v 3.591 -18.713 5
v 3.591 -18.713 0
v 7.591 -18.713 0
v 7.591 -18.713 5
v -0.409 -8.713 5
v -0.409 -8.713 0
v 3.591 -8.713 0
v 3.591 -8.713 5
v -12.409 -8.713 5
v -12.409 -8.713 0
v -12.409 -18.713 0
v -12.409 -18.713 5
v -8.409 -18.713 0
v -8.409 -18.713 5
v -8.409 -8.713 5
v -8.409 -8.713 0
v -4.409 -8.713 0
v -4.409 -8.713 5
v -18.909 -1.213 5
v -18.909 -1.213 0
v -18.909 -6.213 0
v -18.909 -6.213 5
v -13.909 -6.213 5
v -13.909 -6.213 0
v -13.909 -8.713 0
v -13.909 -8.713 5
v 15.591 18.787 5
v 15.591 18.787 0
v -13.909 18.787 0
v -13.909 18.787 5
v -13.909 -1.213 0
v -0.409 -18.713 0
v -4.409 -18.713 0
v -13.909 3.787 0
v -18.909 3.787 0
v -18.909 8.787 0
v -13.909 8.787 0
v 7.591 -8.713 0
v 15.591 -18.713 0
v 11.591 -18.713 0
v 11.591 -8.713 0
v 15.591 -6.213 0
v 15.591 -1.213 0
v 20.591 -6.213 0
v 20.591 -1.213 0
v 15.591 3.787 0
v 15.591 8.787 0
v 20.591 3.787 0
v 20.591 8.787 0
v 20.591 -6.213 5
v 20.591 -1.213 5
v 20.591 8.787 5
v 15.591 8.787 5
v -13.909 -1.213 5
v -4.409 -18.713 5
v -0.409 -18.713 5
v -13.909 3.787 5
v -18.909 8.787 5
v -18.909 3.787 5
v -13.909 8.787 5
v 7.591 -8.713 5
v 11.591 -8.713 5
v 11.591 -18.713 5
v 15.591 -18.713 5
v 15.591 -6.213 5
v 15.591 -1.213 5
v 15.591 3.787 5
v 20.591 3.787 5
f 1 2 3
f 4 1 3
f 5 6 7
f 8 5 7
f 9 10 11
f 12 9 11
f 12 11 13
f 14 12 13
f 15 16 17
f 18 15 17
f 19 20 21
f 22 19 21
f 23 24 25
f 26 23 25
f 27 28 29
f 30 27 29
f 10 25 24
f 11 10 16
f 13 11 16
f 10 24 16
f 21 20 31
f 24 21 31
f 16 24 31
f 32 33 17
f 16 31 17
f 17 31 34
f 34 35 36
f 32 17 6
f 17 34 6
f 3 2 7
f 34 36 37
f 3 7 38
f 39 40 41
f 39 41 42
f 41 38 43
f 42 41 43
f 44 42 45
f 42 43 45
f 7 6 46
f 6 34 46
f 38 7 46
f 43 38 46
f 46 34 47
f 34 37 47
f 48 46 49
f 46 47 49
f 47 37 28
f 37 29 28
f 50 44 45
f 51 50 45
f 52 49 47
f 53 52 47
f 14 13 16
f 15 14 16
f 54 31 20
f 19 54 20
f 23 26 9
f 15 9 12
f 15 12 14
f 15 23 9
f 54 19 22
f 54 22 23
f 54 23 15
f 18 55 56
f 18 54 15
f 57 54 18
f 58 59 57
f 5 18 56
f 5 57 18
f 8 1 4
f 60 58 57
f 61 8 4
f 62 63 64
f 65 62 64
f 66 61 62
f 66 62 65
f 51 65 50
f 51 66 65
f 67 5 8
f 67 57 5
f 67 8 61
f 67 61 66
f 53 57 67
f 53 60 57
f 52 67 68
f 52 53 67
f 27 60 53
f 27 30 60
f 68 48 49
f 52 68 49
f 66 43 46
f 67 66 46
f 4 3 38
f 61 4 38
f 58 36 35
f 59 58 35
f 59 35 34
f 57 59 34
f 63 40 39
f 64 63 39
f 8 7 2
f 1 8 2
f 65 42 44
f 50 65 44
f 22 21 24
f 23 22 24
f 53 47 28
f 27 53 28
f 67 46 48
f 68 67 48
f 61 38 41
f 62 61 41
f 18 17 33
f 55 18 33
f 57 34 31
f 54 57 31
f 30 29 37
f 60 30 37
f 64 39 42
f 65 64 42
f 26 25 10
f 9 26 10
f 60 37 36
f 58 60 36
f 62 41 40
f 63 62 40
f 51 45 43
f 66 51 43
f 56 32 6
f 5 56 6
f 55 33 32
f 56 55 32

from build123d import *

# Parameters (mm, degrees)
BOSS_EXTRU_1_DEPTH = 5


with BuildPart() as part:
    # Esquisse2 → Boss.-Extru.1 (new body)
    with BuildSketch(Plane.XY):
        Polygon((-13.909341466, -8.713061229), (-12.409341466, -8.713061229), (-12.409341466, -18.713061229), (-8.409341466, -18.713061229), (-8.409341466, -8.713061229), (-4.409341466, -8.713061229), (-4.409341466, -18.713061229), (-0.409341466, -18.713061229), (-0.409341466, -8.713061229), (3.590658534, -8.713061229), (3.590658534, -18.713061229), (7.590658534, -18.713061229), (7.590658534, -8.713061229), (11.590658534, -8.713061229), (11.590658534, -18.713061229), (15.590658534, -18.713061229), (15.590658534, -6.213061229), (20.590658534, -6.213061229), (20.590658534, -1.213061229), (15.590658534, -1.213061229), (15.590658534, 3.786938771), (20.590658534, 3.786938771), (20.590658534, 8.786938771), (15.590658534, 8.786938771), (15.590658534, 18.786938771), (-13.909341466, 18.786938771), (-13.909341466, 8.786938771), (-18.909341466, 8.786938771), (-18.909341466, 3.786938771), (-13.909341466, 3.786938771), (-13.909341466, -1.213061229), (-18.909341466, -1.213061229), (-18.909341466, -6.213061229), (-13.909341466, -6.213061229), align=None)
    extrude(amount=BOSS_EXTRU_1_DEPTH)


solid = part.part
